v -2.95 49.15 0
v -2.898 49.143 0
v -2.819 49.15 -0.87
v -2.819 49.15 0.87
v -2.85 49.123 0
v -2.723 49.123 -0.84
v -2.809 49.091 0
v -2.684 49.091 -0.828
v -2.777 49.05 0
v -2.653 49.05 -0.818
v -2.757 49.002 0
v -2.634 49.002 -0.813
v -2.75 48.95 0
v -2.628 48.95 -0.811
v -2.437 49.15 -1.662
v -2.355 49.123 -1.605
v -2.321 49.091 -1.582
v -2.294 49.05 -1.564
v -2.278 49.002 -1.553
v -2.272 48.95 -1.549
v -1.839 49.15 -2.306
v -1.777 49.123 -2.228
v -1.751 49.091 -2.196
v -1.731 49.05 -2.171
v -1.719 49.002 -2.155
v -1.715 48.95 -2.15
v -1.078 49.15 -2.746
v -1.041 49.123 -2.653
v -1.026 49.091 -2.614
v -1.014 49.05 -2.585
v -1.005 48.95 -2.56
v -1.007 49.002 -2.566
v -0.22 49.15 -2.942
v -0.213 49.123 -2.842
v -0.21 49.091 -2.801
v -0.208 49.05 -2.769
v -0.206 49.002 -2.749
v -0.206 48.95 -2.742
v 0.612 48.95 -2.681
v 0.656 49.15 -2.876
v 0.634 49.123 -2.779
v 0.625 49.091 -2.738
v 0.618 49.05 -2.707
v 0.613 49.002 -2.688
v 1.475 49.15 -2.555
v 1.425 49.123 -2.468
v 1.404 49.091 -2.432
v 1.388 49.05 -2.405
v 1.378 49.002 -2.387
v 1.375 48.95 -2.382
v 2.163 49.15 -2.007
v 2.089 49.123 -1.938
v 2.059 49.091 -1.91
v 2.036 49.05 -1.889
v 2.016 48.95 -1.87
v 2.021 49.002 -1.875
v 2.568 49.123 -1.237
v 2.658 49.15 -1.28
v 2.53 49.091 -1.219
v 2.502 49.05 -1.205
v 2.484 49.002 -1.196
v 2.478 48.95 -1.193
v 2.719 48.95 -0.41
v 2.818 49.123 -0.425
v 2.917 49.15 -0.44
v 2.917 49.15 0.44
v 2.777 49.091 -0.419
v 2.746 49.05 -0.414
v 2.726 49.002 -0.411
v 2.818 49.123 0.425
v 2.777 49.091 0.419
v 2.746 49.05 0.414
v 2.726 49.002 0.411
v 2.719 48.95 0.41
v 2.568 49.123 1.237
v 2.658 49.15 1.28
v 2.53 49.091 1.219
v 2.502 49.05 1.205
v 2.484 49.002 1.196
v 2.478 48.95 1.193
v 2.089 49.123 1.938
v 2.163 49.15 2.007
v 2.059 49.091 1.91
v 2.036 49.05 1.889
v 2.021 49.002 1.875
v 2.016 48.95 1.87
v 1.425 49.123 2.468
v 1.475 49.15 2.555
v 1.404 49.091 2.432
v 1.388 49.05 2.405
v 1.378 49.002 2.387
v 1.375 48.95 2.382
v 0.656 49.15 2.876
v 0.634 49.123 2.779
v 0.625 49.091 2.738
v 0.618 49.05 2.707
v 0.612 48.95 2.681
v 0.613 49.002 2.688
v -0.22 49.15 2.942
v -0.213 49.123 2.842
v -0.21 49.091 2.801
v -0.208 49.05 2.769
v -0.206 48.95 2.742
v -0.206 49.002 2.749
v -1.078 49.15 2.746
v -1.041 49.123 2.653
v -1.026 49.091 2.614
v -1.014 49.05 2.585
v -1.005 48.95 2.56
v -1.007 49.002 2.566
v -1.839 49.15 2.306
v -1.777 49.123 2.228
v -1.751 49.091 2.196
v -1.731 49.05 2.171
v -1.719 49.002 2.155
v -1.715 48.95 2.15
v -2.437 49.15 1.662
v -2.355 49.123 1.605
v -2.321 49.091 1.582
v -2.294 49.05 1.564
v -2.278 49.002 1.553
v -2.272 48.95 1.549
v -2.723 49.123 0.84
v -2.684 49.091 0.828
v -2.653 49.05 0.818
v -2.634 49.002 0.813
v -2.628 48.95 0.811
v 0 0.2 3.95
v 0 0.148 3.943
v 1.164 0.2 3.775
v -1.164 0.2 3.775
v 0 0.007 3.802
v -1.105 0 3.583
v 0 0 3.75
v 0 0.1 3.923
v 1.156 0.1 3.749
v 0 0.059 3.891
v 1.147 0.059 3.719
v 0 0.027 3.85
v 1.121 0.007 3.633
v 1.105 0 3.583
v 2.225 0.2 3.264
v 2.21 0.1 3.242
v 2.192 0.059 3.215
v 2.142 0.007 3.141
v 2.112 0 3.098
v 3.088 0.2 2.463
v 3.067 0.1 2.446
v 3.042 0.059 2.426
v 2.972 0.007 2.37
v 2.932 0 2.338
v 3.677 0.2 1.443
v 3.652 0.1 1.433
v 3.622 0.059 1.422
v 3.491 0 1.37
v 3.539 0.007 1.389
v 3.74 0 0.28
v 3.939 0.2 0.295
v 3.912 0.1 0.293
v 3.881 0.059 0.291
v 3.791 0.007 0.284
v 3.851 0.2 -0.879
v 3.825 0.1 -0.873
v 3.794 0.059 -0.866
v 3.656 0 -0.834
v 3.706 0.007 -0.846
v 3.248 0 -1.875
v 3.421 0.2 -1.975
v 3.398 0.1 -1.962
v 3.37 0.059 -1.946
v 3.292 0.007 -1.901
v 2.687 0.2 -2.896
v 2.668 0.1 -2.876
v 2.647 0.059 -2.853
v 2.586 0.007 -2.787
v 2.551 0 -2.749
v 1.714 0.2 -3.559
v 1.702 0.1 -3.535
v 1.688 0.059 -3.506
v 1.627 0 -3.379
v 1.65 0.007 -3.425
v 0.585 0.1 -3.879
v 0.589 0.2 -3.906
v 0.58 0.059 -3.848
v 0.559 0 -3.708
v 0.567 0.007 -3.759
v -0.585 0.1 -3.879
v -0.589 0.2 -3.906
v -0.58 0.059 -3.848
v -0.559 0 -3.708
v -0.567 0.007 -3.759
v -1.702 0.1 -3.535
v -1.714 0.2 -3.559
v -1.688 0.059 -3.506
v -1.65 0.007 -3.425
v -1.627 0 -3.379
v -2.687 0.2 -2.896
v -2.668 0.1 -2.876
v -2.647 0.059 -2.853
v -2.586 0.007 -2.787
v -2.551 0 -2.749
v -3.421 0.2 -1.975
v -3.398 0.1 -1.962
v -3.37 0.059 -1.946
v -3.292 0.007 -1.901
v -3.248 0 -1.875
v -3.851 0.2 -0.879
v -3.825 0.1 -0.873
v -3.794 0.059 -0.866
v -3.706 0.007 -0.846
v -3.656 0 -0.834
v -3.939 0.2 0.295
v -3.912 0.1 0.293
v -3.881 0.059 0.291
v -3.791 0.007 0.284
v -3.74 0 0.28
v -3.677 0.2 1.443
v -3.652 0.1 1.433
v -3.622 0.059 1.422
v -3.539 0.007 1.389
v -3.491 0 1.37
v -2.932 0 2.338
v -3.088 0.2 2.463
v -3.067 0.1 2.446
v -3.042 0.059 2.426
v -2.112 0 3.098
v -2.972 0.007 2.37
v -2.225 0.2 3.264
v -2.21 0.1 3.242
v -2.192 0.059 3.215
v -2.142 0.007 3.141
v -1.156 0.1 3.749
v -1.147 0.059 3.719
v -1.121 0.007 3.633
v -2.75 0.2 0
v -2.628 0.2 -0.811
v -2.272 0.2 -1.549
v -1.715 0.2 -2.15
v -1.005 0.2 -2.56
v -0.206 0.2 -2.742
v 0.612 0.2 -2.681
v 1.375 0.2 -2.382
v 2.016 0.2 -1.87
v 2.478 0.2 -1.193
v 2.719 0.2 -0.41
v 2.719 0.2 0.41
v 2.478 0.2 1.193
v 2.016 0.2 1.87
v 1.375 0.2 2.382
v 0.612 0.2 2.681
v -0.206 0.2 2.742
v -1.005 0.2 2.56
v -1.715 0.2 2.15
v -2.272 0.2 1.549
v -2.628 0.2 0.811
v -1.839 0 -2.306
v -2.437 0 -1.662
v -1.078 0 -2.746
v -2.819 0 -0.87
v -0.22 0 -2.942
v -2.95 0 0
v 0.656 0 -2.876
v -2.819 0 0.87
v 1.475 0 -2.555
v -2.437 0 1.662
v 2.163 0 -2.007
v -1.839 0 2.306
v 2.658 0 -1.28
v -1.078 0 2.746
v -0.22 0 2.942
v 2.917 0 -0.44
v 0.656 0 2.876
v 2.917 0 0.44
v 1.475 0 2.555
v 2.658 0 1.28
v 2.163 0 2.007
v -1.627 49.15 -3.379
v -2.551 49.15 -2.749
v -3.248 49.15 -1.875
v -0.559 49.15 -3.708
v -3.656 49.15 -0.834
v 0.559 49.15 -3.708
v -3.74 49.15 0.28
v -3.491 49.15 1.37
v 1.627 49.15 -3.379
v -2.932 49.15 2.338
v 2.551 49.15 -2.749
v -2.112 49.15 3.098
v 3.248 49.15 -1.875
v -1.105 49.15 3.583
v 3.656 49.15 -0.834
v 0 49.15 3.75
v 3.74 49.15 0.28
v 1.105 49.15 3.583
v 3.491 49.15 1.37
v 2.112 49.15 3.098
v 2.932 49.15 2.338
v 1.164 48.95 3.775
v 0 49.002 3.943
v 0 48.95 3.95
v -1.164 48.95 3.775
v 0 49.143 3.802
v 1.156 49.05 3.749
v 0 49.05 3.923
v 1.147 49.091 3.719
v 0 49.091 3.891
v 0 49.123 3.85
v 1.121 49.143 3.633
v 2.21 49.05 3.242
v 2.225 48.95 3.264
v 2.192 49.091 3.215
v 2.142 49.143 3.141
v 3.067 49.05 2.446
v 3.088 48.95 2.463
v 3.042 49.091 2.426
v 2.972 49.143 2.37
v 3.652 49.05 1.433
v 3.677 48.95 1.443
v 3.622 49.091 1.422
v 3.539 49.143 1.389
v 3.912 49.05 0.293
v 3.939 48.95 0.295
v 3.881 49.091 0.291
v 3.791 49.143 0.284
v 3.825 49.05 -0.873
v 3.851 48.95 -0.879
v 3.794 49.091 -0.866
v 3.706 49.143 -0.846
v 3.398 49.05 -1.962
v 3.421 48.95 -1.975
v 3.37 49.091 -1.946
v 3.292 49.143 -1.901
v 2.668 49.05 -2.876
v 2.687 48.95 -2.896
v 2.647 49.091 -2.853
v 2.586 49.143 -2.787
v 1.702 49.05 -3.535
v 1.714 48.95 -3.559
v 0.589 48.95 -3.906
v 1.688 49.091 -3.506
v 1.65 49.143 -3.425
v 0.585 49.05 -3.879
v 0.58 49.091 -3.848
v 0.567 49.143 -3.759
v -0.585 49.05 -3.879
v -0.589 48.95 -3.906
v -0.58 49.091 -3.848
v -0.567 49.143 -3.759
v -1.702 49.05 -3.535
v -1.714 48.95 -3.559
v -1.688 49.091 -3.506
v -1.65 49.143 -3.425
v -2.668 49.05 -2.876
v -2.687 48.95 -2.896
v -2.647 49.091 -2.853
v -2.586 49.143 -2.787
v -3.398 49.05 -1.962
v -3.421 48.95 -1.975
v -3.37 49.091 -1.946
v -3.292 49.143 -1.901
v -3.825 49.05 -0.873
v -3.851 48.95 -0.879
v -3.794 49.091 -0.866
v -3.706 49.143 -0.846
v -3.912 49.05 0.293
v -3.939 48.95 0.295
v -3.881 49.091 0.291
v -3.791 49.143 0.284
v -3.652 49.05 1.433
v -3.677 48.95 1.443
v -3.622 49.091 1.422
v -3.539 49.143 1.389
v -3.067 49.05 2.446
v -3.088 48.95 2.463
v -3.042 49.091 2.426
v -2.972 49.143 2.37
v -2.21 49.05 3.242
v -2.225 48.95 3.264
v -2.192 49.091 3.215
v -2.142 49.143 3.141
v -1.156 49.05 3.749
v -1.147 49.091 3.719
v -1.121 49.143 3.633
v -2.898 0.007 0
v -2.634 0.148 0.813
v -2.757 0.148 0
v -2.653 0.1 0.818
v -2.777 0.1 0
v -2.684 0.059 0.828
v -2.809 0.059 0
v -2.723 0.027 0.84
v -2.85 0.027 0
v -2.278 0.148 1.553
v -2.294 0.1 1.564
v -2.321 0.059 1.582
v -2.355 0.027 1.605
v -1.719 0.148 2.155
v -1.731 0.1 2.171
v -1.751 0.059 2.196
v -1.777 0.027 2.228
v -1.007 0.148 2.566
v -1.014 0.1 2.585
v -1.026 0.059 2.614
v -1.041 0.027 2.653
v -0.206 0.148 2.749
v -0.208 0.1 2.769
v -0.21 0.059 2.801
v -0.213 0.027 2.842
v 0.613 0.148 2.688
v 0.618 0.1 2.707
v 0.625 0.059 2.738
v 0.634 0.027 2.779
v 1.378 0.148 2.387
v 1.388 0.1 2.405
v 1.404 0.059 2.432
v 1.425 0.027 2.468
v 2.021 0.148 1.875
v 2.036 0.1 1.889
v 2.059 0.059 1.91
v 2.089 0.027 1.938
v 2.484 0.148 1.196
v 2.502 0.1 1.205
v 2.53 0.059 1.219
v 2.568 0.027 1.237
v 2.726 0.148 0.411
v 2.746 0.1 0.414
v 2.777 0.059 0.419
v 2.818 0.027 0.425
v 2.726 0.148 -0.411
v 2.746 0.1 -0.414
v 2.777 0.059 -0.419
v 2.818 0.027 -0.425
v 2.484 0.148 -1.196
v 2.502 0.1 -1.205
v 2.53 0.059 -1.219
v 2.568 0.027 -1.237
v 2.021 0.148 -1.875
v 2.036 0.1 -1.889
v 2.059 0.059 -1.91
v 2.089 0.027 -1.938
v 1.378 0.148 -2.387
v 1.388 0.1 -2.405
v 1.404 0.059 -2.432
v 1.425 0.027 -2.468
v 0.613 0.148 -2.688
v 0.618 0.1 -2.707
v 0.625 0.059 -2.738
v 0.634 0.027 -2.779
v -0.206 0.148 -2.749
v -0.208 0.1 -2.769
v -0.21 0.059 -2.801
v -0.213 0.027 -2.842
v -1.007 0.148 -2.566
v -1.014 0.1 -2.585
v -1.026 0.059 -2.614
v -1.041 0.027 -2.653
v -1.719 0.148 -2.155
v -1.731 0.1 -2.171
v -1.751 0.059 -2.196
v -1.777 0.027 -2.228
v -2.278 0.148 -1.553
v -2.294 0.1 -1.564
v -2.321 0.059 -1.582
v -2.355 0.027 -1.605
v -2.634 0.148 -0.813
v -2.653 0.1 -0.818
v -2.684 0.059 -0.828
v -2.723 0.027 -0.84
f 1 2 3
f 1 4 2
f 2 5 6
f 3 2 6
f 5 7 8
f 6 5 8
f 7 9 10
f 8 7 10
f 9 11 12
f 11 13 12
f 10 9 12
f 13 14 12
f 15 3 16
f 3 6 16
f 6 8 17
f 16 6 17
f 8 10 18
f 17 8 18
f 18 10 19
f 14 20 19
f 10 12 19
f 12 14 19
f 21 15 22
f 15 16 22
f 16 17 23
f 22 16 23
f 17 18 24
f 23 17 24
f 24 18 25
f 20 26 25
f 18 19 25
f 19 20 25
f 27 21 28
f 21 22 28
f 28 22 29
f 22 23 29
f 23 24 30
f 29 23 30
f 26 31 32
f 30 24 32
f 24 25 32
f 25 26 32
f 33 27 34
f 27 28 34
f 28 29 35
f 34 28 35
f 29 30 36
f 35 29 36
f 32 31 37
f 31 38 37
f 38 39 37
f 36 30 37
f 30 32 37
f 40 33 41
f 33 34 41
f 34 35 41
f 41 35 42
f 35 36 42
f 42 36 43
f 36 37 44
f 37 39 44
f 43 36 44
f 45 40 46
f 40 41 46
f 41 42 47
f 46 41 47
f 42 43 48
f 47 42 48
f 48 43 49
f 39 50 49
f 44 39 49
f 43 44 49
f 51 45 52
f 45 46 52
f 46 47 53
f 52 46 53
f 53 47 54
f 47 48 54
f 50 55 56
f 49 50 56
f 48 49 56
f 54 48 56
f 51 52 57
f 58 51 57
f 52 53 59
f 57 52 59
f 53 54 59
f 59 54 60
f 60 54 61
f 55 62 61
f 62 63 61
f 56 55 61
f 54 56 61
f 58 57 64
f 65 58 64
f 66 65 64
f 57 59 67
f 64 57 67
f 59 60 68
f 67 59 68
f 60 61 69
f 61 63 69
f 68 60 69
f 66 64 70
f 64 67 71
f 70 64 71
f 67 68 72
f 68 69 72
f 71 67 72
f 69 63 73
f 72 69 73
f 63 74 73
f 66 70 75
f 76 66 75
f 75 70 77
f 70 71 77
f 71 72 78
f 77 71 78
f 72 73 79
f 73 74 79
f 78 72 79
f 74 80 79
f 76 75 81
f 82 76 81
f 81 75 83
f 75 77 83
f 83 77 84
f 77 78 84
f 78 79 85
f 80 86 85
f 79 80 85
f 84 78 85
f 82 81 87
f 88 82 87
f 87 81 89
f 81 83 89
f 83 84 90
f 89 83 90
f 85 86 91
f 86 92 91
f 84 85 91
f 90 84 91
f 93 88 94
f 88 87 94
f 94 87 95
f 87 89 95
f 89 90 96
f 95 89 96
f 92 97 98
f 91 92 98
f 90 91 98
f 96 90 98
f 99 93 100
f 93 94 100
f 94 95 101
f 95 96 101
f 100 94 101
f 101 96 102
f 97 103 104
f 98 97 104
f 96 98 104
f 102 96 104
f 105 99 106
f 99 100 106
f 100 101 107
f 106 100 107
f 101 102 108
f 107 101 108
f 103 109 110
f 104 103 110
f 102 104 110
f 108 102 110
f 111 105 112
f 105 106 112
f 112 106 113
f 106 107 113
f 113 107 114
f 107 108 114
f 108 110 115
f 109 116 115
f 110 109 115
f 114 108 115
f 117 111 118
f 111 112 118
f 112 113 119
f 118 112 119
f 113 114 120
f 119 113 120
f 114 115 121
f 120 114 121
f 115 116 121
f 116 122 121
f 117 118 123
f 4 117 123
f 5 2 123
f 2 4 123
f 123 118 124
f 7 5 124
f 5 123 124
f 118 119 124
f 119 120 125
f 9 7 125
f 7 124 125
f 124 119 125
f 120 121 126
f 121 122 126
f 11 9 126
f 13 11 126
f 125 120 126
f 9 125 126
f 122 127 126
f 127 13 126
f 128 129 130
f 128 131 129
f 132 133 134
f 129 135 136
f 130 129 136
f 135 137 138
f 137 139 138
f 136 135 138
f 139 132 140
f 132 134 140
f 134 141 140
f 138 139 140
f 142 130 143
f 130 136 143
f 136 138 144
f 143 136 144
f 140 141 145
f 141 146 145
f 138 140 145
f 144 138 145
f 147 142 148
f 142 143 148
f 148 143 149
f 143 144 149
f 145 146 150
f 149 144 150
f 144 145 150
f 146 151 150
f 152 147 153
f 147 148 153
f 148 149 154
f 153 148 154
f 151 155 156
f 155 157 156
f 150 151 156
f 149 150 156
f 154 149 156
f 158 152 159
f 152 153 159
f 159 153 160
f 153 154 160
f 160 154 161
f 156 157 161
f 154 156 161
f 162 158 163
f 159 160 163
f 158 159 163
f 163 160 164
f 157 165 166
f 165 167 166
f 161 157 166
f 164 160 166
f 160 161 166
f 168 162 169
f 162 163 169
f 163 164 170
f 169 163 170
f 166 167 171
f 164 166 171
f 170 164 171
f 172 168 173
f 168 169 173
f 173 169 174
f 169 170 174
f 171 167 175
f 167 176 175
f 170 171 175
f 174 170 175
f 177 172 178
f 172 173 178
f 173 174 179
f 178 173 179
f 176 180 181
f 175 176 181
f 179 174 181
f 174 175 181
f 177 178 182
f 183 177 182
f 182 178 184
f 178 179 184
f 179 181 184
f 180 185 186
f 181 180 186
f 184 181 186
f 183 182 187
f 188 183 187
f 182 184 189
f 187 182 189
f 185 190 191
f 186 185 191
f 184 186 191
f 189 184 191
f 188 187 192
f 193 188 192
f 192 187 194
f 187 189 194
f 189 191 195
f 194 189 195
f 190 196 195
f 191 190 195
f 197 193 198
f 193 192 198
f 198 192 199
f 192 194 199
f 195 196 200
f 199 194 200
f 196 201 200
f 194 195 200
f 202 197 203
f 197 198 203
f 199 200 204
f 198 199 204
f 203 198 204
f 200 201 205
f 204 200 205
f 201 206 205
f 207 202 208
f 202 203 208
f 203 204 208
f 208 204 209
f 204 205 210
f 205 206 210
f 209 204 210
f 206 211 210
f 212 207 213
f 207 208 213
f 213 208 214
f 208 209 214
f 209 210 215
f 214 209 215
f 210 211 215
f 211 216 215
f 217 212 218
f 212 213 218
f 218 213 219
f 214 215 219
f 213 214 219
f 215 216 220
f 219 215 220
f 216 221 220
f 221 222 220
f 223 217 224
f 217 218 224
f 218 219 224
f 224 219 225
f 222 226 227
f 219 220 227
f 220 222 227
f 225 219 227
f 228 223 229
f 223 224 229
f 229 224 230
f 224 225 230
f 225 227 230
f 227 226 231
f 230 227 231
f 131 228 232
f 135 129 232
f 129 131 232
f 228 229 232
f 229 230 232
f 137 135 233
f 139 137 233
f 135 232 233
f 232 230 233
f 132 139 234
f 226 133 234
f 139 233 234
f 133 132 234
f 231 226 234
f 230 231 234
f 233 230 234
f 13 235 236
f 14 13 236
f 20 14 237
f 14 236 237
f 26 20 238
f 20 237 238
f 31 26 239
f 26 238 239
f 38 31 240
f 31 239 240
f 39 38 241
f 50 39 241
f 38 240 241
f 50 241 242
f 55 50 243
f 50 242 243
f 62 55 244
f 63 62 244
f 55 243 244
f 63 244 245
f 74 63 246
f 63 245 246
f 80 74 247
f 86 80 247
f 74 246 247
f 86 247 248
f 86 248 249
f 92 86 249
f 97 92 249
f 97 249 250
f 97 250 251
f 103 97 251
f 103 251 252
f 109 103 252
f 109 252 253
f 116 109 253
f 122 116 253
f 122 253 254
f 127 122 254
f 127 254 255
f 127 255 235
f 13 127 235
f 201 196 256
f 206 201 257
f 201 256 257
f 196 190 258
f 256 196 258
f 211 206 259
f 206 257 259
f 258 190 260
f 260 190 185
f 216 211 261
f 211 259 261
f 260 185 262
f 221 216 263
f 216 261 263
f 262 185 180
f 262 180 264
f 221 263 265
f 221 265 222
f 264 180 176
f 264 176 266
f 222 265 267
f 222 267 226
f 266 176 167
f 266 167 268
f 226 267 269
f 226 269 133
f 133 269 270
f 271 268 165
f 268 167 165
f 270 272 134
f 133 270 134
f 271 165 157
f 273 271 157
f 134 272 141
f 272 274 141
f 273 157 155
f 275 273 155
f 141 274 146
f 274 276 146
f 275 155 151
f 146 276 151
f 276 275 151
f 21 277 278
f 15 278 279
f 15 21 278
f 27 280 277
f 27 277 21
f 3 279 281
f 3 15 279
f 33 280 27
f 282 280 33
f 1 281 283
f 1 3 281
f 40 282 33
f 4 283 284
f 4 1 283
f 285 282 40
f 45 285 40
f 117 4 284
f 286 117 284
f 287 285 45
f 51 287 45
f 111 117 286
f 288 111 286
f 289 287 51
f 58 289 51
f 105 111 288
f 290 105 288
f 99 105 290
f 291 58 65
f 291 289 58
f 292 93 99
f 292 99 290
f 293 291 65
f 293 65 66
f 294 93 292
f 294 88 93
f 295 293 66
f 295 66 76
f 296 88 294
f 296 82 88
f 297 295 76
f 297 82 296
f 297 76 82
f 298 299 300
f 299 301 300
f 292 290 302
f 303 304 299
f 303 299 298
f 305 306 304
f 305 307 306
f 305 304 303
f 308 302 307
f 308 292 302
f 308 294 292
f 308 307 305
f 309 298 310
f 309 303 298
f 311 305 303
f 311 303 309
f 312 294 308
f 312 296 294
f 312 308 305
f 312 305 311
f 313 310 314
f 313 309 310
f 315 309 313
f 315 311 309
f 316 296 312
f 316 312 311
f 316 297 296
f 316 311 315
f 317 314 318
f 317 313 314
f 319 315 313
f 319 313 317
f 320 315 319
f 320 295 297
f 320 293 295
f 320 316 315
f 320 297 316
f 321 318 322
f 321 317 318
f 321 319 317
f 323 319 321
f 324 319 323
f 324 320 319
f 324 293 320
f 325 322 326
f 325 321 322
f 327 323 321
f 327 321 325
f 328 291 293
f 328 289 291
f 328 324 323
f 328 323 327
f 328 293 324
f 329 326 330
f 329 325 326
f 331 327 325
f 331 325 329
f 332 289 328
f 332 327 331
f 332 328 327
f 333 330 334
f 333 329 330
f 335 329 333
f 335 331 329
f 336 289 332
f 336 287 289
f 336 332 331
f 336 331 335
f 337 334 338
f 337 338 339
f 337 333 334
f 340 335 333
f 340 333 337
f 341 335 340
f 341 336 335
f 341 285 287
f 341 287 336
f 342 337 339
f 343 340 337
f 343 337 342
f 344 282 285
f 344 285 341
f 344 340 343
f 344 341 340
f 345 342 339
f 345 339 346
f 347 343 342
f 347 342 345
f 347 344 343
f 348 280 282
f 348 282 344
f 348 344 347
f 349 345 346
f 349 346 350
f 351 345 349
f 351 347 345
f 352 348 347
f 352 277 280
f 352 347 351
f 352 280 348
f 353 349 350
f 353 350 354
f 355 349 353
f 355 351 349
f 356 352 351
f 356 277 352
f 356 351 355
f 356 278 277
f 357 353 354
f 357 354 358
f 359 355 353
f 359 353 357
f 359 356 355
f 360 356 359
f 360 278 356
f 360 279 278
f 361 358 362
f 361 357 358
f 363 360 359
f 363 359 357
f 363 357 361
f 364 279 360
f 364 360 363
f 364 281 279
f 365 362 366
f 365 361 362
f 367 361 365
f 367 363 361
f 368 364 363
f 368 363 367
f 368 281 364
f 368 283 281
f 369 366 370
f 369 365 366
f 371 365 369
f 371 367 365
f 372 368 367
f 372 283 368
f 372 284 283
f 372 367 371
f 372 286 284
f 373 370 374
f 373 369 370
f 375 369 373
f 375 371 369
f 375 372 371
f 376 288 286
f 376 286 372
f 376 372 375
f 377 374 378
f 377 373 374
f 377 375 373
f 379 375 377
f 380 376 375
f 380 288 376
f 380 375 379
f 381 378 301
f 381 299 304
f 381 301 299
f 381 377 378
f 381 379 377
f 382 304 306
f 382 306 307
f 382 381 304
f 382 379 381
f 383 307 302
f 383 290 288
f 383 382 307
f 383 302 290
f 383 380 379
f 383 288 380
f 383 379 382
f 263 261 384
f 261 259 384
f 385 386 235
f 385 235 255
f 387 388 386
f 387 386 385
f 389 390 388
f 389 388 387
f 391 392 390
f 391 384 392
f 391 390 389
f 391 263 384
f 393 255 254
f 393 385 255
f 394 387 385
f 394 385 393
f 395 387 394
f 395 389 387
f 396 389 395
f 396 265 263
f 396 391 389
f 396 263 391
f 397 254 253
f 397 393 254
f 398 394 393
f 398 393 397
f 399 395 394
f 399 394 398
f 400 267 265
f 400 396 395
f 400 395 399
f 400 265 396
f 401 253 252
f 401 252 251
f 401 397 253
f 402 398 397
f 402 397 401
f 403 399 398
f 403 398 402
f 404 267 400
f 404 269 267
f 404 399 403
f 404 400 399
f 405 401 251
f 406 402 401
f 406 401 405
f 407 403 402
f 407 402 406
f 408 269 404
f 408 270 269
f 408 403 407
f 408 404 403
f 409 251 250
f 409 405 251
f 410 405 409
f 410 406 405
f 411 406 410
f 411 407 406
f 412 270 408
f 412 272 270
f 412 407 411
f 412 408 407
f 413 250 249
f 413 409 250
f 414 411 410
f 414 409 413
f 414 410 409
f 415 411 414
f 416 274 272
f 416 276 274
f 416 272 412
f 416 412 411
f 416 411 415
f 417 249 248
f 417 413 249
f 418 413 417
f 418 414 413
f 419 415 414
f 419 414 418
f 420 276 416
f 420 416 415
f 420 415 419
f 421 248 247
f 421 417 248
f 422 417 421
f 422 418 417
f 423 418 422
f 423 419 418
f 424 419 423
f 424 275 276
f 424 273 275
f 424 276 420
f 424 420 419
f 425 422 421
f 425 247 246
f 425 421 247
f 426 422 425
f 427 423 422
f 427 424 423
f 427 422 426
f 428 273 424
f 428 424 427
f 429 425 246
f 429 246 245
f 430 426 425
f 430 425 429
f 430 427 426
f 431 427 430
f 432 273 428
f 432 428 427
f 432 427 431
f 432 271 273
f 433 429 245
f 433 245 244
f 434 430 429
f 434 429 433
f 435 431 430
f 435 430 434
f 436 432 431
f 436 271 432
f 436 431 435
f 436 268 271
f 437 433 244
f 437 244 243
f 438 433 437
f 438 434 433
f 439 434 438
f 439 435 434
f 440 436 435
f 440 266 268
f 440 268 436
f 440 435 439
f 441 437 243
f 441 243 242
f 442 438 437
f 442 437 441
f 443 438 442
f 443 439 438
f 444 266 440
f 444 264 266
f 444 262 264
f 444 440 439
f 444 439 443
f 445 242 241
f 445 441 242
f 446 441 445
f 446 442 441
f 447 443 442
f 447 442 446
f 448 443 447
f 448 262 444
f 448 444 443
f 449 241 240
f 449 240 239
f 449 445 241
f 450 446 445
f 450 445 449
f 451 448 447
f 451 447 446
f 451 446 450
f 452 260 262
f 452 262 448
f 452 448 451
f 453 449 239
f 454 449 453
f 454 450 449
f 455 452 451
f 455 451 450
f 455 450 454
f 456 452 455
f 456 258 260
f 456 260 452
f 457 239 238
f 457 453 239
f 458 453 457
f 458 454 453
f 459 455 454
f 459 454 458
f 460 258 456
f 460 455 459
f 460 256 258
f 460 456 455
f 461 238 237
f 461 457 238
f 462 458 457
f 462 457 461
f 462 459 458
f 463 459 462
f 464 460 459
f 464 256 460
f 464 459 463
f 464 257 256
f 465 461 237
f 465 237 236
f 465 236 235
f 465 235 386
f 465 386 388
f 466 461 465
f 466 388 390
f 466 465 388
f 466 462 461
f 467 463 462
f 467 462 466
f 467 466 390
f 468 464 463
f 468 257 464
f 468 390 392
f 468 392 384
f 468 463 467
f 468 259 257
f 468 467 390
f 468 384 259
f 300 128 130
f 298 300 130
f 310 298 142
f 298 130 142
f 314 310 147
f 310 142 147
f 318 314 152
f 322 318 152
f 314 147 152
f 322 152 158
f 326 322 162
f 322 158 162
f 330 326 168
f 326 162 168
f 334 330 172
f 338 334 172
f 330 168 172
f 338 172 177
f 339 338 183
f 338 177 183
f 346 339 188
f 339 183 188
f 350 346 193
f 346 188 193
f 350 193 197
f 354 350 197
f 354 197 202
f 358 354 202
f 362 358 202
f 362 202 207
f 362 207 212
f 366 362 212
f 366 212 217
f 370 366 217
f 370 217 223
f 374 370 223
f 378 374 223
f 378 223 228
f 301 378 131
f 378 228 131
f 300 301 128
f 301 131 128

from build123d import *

# Parameters (mm, degrees)
SKETCH1_R                = 3.95
BOSS_EXTRUDE1_DEPTH      = 49.15
M5_CLEARANCE_HOLE1_D     = 5.5
M5_CLEARANCE_HOLE1_DEPTH = 49.15
M5_CLEARANCE_HOLE1_TIP   = 1.652366702
FILLET1_R                = 0.2


with BuildPart() as part:
    # Sketch1 → Boss-Extrude1 (new body)
    with BuildSketch(Plane(origin=(0, 0, 0), x_dir=(1, 0, 0), z_dir=(0, 1, 0))):
        Circle(SKETCH1_R)
    extrude(amount=BOSS_EXTRUDE1_DEPTH)

    # M5 Clearance Hole1
    with Locations(Plane(origin=(0, 49.15, 0), x_dir=(1, 0, 0), z_dir=(0, 1, 0))):
        with Locations((0, 0)):
            Hole(M5_CLEARANCE_HOLE1_D / 2, depth=M5_CLEARANCE_HOLE1_DEPTH)
            with Locations((0, 0, -(M5_CLEARANCE_HOLE1_DEPTH + M5_CLEARANCE_HOLE1_TIP / 2))):  # 118° drill point
                Cone(0, M5_CLEARANCE_HOLE1_D / 2, M5_CLEARANCE_HOLE1_TIP, mode=Mode.SUBTRACT)

    # Fillet1
    fillet1_edges = [part.edges().sort_by_distance(p)[0] for p in [
        (2.75, 0, 0),
        (-3.95, 0, 0),
        (-3.95, 49.15, 0),
        (2.75, 49.15, 0),
    ]]
    fillet(fillet1_edges, radius=FILLET1_R)


solid = part.part
